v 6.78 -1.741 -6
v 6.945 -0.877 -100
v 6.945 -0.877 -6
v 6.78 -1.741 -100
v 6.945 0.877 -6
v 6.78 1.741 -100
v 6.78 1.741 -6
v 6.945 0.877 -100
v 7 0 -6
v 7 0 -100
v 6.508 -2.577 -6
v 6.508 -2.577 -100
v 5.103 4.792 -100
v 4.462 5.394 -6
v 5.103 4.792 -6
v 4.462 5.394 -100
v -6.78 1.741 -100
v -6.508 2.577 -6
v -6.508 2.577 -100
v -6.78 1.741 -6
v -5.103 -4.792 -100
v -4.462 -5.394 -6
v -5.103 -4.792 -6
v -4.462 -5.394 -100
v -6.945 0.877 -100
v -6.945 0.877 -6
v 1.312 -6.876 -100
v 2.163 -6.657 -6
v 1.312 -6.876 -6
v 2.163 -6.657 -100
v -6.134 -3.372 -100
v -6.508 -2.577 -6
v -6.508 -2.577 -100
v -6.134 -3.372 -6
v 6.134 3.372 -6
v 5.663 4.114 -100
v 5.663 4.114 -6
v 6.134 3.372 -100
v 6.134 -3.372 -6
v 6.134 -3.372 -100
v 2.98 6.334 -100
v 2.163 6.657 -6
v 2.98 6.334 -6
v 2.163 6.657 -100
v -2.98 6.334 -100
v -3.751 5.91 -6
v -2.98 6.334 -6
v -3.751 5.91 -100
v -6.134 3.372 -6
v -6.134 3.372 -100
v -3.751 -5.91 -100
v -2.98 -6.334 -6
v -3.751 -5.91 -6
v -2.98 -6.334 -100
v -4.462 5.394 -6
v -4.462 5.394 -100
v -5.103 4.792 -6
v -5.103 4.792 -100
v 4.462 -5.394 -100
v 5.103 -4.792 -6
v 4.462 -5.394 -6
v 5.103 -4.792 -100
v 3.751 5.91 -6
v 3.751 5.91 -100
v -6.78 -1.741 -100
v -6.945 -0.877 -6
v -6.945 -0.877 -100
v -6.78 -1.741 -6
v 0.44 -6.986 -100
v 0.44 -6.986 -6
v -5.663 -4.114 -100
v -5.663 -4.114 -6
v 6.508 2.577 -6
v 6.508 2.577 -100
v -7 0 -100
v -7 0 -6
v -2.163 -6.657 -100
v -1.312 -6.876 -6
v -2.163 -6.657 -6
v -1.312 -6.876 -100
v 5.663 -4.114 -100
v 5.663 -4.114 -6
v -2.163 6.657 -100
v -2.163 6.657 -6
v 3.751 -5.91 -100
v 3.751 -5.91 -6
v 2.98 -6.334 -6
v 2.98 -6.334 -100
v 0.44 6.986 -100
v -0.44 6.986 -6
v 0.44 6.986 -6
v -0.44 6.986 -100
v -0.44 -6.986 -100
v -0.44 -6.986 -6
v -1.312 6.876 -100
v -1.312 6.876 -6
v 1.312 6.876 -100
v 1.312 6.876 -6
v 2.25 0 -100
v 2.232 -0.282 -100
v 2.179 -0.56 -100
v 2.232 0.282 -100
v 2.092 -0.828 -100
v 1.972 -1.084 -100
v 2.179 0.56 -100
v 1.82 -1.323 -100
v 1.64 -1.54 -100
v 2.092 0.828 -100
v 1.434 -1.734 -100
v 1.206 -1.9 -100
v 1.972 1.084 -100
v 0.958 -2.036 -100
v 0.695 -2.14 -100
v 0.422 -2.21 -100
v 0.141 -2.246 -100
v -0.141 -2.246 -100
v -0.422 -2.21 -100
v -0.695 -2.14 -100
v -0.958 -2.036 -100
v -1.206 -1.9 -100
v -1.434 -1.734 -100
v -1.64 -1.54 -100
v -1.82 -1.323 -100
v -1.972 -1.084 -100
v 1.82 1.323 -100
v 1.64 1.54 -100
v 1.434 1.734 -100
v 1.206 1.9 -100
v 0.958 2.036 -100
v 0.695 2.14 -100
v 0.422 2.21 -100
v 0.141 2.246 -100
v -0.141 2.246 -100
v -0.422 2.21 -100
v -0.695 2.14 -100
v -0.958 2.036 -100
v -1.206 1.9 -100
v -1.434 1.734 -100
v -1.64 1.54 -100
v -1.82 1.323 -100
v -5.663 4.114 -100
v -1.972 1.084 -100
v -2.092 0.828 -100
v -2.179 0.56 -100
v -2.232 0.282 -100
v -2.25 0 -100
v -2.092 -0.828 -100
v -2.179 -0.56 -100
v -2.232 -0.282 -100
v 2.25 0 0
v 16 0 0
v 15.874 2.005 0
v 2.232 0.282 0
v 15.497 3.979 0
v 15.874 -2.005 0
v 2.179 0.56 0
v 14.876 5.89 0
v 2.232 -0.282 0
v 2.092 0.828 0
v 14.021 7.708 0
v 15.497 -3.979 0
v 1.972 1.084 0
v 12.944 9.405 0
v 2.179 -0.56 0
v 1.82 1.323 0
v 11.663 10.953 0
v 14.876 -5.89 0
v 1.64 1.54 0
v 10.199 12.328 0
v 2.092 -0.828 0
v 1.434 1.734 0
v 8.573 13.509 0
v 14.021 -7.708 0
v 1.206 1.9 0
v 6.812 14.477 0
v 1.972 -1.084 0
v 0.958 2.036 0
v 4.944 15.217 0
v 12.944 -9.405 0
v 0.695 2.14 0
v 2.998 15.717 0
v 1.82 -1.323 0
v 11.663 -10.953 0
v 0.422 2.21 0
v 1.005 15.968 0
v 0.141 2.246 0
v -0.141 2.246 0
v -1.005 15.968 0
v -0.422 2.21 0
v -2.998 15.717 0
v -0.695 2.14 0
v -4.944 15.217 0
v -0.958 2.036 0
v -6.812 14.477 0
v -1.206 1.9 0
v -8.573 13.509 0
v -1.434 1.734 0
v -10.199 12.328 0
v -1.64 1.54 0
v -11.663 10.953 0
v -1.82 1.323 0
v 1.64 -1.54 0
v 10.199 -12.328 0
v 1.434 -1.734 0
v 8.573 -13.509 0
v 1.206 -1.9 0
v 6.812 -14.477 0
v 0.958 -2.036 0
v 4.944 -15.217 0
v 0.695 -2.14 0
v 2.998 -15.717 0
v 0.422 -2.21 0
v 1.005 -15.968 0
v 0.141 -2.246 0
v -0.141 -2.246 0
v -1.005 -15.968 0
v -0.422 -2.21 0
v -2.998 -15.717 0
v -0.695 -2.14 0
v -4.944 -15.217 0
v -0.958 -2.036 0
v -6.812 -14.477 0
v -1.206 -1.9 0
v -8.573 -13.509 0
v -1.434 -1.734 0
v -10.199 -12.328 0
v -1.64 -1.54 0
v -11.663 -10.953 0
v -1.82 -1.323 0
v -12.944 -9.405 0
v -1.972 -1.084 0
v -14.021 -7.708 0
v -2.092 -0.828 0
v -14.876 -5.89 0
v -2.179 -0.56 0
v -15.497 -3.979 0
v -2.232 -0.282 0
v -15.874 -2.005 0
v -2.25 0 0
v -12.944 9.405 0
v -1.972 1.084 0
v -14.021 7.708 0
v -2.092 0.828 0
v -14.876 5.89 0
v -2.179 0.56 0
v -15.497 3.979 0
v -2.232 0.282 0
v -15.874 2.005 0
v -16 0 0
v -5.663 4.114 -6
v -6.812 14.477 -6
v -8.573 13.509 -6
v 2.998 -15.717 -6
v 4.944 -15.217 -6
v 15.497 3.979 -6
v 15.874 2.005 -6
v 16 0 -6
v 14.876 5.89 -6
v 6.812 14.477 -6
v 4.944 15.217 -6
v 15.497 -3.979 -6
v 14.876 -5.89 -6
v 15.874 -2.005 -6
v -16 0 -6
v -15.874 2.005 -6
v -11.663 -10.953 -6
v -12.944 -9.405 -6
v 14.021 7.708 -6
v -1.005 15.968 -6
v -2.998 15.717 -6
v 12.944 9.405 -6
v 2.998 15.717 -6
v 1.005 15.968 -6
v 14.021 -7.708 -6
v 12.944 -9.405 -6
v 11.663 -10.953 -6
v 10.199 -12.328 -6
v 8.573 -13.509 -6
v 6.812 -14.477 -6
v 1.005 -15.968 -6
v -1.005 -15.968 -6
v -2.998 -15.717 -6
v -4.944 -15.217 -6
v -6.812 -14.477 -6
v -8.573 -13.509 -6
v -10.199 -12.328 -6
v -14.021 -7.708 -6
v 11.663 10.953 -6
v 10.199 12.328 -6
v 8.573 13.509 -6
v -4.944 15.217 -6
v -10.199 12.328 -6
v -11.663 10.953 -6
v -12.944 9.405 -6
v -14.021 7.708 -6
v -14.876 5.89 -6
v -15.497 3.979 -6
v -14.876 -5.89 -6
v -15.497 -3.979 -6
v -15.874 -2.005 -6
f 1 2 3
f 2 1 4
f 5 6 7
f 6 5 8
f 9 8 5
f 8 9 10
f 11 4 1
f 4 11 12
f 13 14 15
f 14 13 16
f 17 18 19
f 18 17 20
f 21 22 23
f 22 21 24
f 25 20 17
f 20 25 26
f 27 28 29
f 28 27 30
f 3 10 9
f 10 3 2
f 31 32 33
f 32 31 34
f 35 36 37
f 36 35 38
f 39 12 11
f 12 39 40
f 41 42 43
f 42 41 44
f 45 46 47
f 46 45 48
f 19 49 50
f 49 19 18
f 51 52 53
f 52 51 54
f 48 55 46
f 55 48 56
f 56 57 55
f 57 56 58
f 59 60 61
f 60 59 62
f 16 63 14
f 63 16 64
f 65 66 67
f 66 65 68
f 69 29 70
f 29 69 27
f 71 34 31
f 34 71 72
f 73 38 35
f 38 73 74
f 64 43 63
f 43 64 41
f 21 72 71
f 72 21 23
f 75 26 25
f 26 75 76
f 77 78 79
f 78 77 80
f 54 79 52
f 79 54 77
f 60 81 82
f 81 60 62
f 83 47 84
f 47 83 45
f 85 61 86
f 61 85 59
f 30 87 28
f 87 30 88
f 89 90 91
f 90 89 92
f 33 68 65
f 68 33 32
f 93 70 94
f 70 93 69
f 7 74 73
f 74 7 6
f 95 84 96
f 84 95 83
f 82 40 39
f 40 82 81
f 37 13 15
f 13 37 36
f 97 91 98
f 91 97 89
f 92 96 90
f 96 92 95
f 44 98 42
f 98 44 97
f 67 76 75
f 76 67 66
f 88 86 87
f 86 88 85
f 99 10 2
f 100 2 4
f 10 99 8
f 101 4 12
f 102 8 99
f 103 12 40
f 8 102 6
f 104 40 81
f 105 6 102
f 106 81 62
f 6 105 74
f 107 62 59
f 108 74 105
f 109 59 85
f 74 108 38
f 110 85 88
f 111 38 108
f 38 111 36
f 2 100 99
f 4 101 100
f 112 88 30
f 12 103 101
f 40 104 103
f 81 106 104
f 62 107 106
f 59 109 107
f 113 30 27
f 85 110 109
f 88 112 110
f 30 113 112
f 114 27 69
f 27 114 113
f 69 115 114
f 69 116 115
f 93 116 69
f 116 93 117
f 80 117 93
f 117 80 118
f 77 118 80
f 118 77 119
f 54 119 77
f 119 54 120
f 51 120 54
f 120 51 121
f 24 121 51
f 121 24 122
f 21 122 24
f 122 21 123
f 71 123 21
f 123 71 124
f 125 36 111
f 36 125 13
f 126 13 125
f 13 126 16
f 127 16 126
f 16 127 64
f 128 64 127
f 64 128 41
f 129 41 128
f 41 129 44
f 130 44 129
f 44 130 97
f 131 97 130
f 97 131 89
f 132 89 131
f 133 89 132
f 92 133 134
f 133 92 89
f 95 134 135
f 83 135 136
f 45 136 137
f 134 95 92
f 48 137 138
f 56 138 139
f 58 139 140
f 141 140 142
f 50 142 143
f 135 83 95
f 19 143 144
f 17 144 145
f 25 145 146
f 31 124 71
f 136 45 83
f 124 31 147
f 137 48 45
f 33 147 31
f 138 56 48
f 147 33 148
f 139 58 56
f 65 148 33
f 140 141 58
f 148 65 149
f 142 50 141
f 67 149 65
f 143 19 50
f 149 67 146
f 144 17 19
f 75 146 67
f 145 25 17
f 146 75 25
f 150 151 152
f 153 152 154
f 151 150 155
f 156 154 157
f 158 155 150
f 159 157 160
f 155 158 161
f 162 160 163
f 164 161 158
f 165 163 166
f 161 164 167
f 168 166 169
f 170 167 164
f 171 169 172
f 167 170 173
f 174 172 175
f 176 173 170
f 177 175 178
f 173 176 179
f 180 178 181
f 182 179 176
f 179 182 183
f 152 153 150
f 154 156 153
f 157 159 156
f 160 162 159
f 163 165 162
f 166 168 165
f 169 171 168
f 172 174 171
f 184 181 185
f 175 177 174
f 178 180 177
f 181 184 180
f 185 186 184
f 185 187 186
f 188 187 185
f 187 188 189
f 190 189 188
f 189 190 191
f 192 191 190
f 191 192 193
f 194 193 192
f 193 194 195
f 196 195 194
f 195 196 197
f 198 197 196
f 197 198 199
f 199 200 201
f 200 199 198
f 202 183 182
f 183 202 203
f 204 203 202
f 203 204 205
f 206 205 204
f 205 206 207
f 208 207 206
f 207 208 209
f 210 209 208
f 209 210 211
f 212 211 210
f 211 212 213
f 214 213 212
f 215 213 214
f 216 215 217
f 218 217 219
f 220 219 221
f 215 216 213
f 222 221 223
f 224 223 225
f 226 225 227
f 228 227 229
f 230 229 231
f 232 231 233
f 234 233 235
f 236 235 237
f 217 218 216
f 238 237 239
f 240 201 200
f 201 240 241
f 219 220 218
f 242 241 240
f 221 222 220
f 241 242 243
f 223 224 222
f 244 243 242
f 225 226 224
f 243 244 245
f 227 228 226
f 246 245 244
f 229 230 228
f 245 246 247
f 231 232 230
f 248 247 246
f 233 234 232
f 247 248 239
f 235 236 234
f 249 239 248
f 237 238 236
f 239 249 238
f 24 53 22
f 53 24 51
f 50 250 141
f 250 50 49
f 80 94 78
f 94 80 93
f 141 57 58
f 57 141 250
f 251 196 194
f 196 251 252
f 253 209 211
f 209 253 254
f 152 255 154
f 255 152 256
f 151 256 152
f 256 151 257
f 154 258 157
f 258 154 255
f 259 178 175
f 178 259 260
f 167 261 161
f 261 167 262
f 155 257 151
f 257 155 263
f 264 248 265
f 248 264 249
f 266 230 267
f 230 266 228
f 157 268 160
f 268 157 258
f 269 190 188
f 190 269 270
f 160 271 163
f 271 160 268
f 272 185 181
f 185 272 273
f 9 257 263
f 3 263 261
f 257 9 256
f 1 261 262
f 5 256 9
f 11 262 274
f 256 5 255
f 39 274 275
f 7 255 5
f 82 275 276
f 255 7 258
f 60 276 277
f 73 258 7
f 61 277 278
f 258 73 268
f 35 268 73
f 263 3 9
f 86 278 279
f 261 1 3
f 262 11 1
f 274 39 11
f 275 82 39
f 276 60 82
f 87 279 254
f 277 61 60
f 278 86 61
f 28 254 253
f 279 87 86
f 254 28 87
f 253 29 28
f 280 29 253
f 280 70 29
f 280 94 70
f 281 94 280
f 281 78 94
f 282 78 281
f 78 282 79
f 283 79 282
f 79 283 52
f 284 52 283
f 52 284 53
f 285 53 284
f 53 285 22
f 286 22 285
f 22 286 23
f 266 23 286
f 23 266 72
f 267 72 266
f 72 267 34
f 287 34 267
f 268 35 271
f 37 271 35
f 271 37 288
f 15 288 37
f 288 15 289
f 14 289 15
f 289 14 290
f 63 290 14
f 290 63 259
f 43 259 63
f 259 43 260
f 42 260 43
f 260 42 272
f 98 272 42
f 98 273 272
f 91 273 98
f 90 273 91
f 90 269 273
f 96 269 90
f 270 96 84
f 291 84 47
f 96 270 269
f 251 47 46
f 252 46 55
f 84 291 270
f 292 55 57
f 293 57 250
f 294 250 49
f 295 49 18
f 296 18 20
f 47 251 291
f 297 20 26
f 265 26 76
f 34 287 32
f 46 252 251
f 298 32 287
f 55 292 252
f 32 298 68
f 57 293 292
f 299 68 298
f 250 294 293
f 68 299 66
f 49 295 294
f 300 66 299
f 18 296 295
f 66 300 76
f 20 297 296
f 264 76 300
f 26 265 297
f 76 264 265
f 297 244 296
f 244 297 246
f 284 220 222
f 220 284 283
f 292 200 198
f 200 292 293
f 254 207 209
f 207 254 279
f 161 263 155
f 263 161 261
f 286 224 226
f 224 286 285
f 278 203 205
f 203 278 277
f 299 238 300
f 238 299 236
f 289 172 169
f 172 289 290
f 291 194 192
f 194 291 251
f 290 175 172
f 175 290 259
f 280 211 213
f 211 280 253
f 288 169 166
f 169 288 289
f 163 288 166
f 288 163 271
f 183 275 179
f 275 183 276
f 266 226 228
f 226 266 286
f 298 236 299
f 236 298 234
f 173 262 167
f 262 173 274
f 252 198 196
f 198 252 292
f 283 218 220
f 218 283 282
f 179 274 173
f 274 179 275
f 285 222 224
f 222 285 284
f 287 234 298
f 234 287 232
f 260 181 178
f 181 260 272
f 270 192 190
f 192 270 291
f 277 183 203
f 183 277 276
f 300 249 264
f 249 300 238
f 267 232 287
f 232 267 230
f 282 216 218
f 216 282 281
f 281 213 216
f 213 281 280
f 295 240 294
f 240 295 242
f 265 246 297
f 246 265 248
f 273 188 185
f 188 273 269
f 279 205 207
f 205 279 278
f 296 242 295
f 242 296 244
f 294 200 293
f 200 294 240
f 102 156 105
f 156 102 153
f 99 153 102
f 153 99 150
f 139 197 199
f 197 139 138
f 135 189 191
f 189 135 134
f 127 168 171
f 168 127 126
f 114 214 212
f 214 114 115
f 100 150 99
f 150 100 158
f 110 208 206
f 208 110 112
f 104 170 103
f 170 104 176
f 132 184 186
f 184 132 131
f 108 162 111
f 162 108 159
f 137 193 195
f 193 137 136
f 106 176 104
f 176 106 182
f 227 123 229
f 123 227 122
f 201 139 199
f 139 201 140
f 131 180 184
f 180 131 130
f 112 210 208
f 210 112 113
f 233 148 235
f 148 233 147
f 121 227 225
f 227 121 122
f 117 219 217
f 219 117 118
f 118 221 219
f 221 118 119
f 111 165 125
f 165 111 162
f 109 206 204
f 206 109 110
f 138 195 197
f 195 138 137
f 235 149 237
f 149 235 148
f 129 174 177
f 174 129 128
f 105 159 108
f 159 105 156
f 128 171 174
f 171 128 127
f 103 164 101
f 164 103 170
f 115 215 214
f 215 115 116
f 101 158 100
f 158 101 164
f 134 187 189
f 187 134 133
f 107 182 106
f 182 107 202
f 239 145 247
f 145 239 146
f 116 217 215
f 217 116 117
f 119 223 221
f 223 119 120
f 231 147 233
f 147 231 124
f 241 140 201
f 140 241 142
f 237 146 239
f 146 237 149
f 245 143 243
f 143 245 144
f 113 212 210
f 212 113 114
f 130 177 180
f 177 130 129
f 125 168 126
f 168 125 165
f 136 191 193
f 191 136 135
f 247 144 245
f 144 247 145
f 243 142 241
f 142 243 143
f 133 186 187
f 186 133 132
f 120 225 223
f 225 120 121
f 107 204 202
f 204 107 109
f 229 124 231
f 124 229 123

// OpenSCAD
$fn = 50;


difference() {
	union() {
		translate(v = [0, 0, -100.0000000000]) {
			cylinder(h = 100, r = 7.0000000000);
		}
		translate(v = [0, 0, -6.0000000000]) {
			cylinder(h = 6, r = 16.0000000000);
		}
	}
	union() {
		#translate(v = [0, 0, -100]) {
			cylinder(h = 100, r = 2.2500000000);
		}
	}
}
